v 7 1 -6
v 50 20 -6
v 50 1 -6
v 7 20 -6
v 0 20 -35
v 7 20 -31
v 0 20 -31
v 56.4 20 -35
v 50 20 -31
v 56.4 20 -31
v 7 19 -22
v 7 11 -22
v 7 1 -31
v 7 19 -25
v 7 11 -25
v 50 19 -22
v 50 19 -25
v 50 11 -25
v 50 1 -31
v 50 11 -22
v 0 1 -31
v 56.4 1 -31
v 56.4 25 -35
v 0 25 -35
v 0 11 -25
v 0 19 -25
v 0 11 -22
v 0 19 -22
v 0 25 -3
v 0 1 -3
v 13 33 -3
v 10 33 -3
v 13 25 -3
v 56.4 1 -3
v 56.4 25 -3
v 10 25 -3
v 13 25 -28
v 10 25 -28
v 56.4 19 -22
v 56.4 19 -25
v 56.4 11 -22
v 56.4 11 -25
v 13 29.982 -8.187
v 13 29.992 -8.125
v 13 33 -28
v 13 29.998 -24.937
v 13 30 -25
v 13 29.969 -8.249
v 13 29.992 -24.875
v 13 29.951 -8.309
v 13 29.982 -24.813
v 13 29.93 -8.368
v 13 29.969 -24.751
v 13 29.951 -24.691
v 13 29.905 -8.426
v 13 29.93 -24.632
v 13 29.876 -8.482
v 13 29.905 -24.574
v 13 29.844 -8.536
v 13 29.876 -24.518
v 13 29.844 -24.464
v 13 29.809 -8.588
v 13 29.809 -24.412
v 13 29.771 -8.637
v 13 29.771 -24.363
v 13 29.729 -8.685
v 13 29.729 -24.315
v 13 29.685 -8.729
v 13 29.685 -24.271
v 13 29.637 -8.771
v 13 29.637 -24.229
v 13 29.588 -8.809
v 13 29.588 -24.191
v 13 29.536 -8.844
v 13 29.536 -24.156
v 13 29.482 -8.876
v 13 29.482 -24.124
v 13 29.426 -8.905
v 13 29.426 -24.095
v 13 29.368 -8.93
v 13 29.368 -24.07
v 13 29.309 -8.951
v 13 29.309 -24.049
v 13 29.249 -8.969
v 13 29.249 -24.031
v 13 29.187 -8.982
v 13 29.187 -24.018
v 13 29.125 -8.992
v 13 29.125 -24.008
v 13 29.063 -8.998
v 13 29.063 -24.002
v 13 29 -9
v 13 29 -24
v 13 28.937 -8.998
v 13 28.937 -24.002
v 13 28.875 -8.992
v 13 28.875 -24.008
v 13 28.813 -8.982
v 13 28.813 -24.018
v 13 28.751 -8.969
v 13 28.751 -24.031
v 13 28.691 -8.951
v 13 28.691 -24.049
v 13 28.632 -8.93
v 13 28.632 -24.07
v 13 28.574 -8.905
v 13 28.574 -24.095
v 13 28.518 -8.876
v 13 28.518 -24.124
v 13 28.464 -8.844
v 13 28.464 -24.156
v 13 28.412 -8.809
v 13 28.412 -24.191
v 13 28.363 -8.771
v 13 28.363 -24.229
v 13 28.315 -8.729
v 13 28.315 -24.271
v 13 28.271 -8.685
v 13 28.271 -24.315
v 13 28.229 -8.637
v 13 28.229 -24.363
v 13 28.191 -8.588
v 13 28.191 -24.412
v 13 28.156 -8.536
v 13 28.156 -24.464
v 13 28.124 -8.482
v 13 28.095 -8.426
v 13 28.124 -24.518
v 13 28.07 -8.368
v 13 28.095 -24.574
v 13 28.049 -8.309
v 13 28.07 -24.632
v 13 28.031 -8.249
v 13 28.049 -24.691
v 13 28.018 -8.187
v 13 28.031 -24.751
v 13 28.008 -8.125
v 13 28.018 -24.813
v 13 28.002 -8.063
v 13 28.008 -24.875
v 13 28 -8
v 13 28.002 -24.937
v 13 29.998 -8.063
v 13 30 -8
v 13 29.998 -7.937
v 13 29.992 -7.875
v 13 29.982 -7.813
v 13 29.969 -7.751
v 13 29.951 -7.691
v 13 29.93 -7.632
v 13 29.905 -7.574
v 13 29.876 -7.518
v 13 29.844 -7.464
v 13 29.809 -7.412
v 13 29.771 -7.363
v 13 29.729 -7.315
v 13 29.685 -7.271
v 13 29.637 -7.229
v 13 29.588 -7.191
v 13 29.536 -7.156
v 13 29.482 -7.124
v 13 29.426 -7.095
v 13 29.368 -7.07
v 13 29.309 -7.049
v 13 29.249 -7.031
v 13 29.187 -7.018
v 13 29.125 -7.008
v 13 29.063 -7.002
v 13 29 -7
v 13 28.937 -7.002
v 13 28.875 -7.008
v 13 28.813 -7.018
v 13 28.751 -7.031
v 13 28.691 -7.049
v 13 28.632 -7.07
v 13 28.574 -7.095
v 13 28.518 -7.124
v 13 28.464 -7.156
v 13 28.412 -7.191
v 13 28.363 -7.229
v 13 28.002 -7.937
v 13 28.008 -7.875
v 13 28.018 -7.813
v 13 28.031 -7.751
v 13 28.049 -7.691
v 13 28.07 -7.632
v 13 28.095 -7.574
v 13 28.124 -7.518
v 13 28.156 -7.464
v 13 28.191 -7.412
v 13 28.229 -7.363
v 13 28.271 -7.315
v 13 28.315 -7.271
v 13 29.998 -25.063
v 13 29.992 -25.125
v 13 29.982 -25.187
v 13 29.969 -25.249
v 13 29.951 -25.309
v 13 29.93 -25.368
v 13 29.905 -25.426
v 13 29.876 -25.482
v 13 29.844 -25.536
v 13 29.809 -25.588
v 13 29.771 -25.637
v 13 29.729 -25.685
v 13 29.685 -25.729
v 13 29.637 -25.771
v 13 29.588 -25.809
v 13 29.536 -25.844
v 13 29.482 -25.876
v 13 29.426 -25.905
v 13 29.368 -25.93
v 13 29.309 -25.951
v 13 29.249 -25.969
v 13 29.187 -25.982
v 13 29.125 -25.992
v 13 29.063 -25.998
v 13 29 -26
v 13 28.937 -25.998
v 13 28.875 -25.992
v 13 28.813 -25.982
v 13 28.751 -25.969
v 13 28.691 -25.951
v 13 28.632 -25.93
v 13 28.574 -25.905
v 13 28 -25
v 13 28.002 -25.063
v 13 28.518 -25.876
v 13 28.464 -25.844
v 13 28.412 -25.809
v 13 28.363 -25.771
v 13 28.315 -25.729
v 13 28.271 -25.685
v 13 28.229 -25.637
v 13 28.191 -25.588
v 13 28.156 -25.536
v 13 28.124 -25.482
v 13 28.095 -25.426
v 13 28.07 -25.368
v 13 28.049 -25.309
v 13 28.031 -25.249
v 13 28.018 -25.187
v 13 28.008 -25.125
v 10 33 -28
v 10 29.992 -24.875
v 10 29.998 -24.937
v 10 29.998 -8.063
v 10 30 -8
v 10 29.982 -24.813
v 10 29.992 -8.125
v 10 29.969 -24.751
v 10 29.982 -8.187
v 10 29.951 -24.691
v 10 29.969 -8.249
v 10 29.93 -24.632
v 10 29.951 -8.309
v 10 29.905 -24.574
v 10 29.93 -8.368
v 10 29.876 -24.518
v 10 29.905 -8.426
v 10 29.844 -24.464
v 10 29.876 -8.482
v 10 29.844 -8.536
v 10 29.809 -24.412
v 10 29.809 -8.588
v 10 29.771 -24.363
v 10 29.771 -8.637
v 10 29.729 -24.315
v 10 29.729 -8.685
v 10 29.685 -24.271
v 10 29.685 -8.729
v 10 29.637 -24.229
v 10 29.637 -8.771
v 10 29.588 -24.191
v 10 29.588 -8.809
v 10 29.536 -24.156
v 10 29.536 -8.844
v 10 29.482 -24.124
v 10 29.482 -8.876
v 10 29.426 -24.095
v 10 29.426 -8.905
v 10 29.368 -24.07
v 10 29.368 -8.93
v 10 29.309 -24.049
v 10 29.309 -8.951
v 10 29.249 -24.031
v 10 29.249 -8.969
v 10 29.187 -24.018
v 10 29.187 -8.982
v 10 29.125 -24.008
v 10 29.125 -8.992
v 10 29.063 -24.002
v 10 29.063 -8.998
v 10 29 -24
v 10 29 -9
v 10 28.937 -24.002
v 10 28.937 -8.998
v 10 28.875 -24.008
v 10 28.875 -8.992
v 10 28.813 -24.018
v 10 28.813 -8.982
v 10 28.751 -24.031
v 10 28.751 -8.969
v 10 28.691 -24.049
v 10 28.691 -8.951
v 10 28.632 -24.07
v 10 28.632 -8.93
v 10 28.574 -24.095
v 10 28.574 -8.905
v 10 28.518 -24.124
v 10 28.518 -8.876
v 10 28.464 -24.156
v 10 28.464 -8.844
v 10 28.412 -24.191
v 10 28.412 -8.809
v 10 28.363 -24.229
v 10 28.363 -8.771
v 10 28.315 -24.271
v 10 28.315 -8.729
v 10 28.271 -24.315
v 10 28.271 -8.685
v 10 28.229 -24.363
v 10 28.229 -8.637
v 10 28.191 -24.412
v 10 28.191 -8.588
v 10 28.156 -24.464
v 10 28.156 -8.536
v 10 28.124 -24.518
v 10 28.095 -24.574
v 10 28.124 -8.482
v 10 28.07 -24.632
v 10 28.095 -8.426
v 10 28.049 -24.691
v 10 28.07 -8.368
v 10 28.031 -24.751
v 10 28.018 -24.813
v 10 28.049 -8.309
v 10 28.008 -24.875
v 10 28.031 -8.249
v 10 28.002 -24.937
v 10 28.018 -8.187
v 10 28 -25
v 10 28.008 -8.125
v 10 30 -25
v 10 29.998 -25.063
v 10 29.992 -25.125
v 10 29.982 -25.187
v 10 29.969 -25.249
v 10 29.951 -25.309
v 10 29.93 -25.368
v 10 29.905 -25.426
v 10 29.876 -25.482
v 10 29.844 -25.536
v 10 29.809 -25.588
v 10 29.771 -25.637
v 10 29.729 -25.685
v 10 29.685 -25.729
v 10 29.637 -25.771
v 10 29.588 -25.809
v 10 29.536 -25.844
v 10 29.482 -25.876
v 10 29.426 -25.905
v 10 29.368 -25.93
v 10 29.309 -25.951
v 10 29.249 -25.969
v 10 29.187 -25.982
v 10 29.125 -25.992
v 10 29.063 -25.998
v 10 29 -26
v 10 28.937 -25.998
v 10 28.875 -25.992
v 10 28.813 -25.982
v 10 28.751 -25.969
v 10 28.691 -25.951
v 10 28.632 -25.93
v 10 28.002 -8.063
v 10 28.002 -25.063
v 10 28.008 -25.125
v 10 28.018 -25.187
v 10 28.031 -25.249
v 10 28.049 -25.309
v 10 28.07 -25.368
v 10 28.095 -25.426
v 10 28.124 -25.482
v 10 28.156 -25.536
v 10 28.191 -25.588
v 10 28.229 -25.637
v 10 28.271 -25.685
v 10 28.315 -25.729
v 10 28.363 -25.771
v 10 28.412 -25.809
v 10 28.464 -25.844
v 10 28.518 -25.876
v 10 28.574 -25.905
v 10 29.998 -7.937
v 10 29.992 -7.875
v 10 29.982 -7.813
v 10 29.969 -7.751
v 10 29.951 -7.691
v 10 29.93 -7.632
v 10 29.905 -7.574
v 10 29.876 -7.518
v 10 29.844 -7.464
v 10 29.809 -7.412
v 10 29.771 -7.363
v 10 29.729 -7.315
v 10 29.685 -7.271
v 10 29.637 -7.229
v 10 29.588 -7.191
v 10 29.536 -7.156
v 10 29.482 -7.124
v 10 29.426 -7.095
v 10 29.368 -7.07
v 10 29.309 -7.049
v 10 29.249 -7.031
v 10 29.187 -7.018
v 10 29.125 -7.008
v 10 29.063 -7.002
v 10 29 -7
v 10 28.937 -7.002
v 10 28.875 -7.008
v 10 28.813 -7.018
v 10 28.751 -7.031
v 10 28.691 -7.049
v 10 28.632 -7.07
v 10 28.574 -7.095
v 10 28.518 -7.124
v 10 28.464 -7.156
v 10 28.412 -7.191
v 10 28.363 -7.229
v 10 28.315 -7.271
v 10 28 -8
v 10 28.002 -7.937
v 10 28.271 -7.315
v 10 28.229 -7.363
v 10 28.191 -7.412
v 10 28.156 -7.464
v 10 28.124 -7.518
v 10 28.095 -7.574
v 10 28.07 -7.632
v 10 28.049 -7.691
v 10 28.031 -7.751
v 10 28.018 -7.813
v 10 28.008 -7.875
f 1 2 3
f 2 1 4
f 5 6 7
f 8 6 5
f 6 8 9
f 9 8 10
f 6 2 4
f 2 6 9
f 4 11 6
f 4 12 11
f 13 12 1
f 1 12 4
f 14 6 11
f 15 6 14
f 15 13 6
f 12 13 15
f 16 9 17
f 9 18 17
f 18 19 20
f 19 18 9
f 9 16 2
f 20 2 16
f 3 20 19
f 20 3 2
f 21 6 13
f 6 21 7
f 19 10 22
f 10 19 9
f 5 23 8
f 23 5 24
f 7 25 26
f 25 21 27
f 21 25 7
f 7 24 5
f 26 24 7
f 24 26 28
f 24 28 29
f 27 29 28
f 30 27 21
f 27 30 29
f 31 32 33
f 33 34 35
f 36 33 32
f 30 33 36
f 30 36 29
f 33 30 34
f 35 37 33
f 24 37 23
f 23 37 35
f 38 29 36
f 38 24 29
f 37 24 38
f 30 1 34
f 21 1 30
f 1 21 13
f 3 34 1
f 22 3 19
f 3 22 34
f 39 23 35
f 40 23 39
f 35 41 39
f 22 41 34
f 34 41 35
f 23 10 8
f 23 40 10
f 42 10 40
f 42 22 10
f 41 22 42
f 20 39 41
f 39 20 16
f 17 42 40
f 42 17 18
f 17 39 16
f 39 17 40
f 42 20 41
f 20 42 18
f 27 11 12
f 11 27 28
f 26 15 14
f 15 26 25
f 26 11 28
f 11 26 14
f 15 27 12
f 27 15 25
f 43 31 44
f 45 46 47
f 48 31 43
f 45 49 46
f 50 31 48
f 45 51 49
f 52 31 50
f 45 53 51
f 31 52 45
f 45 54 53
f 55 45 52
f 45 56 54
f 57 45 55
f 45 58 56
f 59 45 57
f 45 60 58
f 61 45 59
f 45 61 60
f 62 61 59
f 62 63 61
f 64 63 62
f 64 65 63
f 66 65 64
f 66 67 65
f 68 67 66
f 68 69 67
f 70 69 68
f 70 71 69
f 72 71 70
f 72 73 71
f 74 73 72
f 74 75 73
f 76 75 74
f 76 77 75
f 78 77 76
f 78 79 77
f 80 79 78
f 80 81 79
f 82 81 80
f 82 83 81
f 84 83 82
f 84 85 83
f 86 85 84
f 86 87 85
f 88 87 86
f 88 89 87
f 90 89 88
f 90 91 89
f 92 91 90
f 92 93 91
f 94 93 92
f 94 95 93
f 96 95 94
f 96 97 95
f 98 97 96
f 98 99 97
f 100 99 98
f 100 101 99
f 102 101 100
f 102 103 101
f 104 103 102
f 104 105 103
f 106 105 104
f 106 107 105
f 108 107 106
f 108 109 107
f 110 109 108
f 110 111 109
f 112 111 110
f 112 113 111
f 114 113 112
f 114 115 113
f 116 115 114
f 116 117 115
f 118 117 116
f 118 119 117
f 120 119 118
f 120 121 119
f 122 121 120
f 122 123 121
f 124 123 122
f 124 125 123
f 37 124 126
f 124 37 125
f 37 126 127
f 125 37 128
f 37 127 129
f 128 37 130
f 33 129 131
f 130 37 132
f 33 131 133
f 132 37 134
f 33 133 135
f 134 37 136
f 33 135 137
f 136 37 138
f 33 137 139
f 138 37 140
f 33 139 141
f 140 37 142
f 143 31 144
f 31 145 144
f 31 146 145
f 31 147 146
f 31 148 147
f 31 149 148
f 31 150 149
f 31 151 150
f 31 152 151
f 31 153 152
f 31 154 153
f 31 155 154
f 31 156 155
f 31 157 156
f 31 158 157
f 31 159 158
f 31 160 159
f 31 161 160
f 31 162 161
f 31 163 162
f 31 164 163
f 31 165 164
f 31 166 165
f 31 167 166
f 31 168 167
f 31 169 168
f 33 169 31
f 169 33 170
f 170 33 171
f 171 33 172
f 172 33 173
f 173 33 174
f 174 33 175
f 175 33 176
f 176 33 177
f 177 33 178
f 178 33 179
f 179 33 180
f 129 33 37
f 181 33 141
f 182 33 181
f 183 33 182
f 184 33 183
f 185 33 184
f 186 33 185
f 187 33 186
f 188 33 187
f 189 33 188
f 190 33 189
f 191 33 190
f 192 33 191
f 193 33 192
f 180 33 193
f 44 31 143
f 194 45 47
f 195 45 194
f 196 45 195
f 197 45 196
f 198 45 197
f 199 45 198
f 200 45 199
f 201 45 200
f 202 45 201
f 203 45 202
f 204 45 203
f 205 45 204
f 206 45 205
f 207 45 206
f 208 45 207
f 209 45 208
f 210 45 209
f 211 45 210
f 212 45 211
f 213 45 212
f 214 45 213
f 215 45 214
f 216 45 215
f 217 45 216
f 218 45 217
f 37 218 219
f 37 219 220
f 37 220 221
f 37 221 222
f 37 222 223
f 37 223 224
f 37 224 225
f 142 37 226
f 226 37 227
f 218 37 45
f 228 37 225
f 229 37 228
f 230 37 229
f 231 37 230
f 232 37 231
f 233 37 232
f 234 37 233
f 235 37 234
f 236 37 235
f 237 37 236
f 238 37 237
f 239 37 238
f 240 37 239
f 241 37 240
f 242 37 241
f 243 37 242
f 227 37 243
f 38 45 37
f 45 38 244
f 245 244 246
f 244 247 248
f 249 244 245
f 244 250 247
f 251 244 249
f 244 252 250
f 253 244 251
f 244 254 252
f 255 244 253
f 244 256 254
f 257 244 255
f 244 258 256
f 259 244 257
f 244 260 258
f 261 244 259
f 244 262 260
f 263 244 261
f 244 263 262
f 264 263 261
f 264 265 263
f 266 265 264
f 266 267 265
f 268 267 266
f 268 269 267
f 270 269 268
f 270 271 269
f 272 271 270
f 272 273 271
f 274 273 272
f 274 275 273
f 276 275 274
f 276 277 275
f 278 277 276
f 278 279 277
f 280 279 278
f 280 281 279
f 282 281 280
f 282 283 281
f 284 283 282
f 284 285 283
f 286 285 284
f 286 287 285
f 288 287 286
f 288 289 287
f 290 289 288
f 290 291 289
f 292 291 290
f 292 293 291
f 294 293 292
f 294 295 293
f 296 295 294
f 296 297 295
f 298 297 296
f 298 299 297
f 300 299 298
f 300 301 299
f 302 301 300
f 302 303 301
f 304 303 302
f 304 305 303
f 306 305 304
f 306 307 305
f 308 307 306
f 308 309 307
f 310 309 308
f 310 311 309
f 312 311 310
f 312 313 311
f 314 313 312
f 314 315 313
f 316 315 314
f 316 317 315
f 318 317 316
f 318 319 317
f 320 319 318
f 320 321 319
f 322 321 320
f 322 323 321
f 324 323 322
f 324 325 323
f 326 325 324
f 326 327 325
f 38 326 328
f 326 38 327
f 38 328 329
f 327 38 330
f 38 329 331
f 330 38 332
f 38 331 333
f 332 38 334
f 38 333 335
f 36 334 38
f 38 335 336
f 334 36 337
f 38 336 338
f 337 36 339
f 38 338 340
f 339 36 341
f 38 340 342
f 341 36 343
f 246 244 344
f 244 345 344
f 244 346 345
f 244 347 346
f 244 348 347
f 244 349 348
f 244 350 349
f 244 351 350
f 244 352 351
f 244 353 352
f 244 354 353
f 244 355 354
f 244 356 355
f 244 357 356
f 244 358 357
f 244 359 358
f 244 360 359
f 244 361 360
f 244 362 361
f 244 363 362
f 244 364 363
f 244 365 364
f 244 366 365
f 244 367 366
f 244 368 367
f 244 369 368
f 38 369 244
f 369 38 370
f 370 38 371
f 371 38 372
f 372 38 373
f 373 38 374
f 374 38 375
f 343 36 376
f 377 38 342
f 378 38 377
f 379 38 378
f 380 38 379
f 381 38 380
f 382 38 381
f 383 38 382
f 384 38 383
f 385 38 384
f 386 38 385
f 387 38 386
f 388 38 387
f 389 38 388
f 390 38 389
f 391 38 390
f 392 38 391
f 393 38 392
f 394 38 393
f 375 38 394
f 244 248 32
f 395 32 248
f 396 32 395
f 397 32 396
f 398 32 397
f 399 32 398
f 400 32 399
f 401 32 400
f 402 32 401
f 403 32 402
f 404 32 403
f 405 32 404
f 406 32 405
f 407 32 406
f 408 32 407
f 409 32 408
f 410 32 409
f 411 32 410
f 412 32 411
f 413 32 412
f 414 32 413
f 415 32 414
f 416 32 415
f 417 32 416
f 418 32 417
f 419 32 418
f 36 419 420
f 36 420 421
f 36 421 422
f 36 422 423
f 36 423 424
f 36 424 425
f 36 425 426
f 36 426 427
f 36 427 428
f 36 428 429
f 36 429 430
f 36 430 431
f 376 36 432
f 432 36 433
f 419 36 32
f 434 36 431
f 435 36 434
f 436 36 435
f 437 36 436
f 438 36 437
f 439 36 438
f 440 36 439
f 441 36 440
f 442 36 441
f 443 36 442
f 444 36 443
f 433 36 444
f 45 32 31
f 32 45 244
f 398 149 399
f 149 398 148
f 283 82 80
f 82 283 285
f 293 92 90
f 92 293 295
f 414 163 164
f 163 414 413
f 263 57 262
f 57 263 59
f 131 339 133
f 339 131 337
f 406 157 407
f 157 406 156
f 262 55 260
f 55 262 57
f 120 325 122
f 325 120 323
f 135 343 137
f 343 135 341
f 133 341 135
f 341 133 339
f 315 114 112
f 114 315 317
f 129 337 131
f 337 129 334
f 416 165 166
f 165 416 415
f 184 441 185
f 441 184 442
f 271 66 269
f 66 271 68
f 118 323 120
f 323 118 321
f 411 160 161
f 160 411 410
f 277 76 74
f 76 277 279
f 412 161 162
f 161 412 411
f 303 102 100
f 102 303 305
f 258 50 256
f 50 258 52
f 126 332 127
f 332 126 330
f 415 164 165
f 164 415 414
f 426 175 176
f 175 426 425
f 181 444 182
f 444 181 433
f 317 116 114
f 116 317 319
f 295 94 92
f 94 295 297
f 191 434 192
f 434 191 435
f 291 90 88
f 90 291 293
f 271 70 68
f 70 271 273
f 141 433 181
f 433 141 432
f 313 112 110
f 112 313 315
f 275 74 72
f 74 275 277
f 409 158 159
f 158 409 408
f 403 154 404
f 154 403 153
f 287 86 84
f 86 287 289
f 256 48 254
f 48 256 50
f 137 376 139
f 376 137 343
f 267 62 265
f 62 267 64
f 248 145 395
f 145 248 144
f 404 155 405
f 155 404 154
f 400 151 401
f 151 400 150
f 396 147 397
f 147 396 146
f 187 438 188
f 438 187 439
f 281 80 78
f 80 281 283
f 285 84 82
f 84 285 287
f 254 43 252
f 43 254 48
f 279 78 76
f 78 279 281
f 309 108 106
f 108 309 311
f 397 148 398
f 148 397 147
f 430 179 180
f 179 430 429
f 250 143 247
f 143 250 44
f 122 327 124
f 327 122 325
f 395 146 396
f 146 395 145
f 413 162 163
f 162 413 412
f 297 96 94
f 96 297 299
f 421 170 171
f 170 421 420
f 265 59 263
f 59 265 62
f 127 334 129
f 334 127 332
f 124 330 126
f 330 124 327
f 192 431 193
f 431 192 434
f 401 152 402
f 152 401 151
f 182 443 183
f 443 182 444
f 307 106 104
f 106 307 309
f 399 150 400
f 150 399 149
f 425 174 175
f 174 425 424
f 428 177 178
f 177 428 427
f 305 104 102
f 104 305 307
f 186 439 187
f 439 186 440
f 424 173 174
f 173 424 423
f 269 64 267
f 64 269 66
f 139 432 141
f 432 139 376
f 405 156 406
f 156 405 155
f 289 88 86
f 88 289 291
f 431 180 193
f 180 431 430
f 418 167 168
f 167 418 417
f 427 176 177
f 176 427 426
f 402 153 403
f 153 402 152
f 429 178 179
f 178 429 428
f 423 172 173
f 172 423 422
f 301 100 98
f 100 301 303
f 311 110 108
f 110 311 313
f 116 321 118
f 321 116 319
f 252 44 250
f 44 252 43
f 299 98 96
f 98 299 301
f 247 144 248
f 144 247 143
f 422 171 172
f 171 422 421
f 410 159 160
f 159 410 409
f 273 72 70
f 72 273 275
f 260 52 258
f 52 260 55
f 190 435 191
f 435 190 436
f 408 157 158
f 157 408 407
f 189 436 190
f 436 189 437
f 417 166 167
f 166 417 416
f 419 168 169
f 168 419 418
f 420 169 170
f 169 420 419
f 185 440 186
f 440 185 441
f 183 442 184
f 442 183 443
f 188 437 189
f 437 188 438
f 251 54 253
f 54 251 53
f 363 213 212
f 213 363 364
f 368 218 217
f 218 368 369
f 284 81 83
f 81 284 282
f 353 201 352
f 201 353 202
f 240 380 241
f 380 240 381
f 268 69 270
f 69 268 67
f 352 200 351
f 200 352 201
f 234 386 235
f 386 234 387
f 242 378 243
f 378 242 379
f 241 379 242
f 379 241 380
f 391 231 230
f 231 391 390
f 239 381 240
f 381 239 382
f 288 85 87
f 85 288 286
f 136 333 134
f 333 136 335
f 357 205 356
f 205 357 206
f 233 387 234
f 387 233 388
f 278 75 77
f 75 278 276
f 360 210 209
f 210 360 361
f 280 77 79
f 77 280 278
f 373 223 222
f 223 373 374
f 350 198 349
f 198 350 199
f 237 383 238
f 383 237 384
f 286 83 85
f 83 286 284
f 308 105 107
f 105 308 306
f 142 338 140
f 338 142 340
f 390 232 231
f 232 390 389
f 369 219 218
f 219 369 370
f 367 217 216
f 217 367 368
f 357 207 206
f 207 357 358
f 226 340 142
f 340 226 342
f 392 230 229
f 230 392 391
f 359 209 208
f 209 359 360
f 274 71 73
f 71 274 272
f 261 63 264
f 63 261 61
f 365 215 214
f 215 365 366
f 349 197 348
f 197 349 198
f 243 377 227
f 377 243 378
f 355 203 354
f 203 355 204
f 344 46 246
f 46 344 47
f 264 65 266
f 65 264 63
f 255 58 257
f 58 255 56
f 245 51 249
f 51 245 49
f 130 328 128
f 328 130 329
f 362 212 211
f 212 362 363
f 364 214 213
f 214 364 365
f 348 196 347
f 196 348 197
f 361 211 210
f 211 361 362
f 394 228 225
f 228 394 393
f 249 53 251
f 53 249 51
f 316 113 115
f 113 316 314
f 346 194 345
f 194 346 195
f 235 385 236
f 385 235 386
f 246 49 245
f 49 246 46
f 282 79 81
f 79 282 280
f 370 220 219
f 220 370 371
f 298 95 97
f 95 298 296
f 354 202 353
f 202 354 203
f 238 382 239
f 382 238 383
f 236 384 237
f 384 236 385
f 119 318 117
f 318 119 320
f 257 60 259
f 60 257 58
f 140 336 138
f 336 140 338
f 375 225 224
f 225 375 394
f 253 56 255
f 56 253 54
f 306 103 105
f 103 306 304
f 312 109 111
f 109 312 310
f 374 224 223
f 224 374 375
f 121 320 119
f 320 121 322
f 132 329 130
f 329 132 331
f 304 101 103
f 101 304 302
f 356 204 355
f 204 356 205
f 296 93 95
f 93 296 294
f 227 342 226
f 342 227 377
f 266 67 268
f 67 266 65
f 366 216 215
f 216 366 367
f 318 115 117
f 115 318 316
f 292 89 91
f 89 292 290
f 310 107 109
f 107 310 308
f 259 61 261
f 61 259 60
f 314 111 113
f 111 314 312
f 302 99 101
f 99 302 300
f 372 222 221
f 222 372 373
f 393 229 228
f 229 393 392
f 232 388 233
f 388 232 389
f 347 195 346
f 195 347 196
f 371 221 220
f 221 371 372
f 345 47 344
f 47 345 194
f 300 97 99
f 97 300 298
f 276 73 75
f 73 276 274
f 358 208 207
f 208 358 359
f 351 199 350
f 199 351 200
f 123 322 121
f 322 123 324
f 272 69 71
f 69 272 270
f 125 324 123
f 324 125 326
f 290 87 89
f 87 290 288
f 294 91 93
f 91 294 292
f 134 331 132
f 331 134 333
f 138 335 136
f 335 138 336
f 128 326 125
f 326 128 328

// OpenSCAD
$fn=100;

module base()
{
		#translate([10,25,-28]) cube([3,8,25]);
}

module vis()
{
	#rotate([0,90,0]) translate([8,29,5]) cylinder(d=2, h=10);
	#rotate([0,90,0]) translate([25,29,5]) cylinder(d=2, h=10);
}

module servo()
{
	translate([0,0,0])       cube([20,43,36]);
   translate([0,-6.5,25]) cube([20,57,10]);
   translate([10,10,36]) cylinder(d=15, h=2);
}

module porte_servo()
{
	difference()
	{
		translate([0,25,-3]) rotate([180,0,0]) cube([56.4,24,32]);
		translate([50,20,-6]) rotate([180,0,270]) servo();
		//translate([50,7,-9]) cube([7,9,3]);
		#translate([49,11,-25]) cube([9,8,3]);
		#translate([-1,11,-25]) cube([9,8,3]);
        
	}
}

difference()
{
	union()
	{
		base();
		porte_servo();
	}
		vis();
	
}
